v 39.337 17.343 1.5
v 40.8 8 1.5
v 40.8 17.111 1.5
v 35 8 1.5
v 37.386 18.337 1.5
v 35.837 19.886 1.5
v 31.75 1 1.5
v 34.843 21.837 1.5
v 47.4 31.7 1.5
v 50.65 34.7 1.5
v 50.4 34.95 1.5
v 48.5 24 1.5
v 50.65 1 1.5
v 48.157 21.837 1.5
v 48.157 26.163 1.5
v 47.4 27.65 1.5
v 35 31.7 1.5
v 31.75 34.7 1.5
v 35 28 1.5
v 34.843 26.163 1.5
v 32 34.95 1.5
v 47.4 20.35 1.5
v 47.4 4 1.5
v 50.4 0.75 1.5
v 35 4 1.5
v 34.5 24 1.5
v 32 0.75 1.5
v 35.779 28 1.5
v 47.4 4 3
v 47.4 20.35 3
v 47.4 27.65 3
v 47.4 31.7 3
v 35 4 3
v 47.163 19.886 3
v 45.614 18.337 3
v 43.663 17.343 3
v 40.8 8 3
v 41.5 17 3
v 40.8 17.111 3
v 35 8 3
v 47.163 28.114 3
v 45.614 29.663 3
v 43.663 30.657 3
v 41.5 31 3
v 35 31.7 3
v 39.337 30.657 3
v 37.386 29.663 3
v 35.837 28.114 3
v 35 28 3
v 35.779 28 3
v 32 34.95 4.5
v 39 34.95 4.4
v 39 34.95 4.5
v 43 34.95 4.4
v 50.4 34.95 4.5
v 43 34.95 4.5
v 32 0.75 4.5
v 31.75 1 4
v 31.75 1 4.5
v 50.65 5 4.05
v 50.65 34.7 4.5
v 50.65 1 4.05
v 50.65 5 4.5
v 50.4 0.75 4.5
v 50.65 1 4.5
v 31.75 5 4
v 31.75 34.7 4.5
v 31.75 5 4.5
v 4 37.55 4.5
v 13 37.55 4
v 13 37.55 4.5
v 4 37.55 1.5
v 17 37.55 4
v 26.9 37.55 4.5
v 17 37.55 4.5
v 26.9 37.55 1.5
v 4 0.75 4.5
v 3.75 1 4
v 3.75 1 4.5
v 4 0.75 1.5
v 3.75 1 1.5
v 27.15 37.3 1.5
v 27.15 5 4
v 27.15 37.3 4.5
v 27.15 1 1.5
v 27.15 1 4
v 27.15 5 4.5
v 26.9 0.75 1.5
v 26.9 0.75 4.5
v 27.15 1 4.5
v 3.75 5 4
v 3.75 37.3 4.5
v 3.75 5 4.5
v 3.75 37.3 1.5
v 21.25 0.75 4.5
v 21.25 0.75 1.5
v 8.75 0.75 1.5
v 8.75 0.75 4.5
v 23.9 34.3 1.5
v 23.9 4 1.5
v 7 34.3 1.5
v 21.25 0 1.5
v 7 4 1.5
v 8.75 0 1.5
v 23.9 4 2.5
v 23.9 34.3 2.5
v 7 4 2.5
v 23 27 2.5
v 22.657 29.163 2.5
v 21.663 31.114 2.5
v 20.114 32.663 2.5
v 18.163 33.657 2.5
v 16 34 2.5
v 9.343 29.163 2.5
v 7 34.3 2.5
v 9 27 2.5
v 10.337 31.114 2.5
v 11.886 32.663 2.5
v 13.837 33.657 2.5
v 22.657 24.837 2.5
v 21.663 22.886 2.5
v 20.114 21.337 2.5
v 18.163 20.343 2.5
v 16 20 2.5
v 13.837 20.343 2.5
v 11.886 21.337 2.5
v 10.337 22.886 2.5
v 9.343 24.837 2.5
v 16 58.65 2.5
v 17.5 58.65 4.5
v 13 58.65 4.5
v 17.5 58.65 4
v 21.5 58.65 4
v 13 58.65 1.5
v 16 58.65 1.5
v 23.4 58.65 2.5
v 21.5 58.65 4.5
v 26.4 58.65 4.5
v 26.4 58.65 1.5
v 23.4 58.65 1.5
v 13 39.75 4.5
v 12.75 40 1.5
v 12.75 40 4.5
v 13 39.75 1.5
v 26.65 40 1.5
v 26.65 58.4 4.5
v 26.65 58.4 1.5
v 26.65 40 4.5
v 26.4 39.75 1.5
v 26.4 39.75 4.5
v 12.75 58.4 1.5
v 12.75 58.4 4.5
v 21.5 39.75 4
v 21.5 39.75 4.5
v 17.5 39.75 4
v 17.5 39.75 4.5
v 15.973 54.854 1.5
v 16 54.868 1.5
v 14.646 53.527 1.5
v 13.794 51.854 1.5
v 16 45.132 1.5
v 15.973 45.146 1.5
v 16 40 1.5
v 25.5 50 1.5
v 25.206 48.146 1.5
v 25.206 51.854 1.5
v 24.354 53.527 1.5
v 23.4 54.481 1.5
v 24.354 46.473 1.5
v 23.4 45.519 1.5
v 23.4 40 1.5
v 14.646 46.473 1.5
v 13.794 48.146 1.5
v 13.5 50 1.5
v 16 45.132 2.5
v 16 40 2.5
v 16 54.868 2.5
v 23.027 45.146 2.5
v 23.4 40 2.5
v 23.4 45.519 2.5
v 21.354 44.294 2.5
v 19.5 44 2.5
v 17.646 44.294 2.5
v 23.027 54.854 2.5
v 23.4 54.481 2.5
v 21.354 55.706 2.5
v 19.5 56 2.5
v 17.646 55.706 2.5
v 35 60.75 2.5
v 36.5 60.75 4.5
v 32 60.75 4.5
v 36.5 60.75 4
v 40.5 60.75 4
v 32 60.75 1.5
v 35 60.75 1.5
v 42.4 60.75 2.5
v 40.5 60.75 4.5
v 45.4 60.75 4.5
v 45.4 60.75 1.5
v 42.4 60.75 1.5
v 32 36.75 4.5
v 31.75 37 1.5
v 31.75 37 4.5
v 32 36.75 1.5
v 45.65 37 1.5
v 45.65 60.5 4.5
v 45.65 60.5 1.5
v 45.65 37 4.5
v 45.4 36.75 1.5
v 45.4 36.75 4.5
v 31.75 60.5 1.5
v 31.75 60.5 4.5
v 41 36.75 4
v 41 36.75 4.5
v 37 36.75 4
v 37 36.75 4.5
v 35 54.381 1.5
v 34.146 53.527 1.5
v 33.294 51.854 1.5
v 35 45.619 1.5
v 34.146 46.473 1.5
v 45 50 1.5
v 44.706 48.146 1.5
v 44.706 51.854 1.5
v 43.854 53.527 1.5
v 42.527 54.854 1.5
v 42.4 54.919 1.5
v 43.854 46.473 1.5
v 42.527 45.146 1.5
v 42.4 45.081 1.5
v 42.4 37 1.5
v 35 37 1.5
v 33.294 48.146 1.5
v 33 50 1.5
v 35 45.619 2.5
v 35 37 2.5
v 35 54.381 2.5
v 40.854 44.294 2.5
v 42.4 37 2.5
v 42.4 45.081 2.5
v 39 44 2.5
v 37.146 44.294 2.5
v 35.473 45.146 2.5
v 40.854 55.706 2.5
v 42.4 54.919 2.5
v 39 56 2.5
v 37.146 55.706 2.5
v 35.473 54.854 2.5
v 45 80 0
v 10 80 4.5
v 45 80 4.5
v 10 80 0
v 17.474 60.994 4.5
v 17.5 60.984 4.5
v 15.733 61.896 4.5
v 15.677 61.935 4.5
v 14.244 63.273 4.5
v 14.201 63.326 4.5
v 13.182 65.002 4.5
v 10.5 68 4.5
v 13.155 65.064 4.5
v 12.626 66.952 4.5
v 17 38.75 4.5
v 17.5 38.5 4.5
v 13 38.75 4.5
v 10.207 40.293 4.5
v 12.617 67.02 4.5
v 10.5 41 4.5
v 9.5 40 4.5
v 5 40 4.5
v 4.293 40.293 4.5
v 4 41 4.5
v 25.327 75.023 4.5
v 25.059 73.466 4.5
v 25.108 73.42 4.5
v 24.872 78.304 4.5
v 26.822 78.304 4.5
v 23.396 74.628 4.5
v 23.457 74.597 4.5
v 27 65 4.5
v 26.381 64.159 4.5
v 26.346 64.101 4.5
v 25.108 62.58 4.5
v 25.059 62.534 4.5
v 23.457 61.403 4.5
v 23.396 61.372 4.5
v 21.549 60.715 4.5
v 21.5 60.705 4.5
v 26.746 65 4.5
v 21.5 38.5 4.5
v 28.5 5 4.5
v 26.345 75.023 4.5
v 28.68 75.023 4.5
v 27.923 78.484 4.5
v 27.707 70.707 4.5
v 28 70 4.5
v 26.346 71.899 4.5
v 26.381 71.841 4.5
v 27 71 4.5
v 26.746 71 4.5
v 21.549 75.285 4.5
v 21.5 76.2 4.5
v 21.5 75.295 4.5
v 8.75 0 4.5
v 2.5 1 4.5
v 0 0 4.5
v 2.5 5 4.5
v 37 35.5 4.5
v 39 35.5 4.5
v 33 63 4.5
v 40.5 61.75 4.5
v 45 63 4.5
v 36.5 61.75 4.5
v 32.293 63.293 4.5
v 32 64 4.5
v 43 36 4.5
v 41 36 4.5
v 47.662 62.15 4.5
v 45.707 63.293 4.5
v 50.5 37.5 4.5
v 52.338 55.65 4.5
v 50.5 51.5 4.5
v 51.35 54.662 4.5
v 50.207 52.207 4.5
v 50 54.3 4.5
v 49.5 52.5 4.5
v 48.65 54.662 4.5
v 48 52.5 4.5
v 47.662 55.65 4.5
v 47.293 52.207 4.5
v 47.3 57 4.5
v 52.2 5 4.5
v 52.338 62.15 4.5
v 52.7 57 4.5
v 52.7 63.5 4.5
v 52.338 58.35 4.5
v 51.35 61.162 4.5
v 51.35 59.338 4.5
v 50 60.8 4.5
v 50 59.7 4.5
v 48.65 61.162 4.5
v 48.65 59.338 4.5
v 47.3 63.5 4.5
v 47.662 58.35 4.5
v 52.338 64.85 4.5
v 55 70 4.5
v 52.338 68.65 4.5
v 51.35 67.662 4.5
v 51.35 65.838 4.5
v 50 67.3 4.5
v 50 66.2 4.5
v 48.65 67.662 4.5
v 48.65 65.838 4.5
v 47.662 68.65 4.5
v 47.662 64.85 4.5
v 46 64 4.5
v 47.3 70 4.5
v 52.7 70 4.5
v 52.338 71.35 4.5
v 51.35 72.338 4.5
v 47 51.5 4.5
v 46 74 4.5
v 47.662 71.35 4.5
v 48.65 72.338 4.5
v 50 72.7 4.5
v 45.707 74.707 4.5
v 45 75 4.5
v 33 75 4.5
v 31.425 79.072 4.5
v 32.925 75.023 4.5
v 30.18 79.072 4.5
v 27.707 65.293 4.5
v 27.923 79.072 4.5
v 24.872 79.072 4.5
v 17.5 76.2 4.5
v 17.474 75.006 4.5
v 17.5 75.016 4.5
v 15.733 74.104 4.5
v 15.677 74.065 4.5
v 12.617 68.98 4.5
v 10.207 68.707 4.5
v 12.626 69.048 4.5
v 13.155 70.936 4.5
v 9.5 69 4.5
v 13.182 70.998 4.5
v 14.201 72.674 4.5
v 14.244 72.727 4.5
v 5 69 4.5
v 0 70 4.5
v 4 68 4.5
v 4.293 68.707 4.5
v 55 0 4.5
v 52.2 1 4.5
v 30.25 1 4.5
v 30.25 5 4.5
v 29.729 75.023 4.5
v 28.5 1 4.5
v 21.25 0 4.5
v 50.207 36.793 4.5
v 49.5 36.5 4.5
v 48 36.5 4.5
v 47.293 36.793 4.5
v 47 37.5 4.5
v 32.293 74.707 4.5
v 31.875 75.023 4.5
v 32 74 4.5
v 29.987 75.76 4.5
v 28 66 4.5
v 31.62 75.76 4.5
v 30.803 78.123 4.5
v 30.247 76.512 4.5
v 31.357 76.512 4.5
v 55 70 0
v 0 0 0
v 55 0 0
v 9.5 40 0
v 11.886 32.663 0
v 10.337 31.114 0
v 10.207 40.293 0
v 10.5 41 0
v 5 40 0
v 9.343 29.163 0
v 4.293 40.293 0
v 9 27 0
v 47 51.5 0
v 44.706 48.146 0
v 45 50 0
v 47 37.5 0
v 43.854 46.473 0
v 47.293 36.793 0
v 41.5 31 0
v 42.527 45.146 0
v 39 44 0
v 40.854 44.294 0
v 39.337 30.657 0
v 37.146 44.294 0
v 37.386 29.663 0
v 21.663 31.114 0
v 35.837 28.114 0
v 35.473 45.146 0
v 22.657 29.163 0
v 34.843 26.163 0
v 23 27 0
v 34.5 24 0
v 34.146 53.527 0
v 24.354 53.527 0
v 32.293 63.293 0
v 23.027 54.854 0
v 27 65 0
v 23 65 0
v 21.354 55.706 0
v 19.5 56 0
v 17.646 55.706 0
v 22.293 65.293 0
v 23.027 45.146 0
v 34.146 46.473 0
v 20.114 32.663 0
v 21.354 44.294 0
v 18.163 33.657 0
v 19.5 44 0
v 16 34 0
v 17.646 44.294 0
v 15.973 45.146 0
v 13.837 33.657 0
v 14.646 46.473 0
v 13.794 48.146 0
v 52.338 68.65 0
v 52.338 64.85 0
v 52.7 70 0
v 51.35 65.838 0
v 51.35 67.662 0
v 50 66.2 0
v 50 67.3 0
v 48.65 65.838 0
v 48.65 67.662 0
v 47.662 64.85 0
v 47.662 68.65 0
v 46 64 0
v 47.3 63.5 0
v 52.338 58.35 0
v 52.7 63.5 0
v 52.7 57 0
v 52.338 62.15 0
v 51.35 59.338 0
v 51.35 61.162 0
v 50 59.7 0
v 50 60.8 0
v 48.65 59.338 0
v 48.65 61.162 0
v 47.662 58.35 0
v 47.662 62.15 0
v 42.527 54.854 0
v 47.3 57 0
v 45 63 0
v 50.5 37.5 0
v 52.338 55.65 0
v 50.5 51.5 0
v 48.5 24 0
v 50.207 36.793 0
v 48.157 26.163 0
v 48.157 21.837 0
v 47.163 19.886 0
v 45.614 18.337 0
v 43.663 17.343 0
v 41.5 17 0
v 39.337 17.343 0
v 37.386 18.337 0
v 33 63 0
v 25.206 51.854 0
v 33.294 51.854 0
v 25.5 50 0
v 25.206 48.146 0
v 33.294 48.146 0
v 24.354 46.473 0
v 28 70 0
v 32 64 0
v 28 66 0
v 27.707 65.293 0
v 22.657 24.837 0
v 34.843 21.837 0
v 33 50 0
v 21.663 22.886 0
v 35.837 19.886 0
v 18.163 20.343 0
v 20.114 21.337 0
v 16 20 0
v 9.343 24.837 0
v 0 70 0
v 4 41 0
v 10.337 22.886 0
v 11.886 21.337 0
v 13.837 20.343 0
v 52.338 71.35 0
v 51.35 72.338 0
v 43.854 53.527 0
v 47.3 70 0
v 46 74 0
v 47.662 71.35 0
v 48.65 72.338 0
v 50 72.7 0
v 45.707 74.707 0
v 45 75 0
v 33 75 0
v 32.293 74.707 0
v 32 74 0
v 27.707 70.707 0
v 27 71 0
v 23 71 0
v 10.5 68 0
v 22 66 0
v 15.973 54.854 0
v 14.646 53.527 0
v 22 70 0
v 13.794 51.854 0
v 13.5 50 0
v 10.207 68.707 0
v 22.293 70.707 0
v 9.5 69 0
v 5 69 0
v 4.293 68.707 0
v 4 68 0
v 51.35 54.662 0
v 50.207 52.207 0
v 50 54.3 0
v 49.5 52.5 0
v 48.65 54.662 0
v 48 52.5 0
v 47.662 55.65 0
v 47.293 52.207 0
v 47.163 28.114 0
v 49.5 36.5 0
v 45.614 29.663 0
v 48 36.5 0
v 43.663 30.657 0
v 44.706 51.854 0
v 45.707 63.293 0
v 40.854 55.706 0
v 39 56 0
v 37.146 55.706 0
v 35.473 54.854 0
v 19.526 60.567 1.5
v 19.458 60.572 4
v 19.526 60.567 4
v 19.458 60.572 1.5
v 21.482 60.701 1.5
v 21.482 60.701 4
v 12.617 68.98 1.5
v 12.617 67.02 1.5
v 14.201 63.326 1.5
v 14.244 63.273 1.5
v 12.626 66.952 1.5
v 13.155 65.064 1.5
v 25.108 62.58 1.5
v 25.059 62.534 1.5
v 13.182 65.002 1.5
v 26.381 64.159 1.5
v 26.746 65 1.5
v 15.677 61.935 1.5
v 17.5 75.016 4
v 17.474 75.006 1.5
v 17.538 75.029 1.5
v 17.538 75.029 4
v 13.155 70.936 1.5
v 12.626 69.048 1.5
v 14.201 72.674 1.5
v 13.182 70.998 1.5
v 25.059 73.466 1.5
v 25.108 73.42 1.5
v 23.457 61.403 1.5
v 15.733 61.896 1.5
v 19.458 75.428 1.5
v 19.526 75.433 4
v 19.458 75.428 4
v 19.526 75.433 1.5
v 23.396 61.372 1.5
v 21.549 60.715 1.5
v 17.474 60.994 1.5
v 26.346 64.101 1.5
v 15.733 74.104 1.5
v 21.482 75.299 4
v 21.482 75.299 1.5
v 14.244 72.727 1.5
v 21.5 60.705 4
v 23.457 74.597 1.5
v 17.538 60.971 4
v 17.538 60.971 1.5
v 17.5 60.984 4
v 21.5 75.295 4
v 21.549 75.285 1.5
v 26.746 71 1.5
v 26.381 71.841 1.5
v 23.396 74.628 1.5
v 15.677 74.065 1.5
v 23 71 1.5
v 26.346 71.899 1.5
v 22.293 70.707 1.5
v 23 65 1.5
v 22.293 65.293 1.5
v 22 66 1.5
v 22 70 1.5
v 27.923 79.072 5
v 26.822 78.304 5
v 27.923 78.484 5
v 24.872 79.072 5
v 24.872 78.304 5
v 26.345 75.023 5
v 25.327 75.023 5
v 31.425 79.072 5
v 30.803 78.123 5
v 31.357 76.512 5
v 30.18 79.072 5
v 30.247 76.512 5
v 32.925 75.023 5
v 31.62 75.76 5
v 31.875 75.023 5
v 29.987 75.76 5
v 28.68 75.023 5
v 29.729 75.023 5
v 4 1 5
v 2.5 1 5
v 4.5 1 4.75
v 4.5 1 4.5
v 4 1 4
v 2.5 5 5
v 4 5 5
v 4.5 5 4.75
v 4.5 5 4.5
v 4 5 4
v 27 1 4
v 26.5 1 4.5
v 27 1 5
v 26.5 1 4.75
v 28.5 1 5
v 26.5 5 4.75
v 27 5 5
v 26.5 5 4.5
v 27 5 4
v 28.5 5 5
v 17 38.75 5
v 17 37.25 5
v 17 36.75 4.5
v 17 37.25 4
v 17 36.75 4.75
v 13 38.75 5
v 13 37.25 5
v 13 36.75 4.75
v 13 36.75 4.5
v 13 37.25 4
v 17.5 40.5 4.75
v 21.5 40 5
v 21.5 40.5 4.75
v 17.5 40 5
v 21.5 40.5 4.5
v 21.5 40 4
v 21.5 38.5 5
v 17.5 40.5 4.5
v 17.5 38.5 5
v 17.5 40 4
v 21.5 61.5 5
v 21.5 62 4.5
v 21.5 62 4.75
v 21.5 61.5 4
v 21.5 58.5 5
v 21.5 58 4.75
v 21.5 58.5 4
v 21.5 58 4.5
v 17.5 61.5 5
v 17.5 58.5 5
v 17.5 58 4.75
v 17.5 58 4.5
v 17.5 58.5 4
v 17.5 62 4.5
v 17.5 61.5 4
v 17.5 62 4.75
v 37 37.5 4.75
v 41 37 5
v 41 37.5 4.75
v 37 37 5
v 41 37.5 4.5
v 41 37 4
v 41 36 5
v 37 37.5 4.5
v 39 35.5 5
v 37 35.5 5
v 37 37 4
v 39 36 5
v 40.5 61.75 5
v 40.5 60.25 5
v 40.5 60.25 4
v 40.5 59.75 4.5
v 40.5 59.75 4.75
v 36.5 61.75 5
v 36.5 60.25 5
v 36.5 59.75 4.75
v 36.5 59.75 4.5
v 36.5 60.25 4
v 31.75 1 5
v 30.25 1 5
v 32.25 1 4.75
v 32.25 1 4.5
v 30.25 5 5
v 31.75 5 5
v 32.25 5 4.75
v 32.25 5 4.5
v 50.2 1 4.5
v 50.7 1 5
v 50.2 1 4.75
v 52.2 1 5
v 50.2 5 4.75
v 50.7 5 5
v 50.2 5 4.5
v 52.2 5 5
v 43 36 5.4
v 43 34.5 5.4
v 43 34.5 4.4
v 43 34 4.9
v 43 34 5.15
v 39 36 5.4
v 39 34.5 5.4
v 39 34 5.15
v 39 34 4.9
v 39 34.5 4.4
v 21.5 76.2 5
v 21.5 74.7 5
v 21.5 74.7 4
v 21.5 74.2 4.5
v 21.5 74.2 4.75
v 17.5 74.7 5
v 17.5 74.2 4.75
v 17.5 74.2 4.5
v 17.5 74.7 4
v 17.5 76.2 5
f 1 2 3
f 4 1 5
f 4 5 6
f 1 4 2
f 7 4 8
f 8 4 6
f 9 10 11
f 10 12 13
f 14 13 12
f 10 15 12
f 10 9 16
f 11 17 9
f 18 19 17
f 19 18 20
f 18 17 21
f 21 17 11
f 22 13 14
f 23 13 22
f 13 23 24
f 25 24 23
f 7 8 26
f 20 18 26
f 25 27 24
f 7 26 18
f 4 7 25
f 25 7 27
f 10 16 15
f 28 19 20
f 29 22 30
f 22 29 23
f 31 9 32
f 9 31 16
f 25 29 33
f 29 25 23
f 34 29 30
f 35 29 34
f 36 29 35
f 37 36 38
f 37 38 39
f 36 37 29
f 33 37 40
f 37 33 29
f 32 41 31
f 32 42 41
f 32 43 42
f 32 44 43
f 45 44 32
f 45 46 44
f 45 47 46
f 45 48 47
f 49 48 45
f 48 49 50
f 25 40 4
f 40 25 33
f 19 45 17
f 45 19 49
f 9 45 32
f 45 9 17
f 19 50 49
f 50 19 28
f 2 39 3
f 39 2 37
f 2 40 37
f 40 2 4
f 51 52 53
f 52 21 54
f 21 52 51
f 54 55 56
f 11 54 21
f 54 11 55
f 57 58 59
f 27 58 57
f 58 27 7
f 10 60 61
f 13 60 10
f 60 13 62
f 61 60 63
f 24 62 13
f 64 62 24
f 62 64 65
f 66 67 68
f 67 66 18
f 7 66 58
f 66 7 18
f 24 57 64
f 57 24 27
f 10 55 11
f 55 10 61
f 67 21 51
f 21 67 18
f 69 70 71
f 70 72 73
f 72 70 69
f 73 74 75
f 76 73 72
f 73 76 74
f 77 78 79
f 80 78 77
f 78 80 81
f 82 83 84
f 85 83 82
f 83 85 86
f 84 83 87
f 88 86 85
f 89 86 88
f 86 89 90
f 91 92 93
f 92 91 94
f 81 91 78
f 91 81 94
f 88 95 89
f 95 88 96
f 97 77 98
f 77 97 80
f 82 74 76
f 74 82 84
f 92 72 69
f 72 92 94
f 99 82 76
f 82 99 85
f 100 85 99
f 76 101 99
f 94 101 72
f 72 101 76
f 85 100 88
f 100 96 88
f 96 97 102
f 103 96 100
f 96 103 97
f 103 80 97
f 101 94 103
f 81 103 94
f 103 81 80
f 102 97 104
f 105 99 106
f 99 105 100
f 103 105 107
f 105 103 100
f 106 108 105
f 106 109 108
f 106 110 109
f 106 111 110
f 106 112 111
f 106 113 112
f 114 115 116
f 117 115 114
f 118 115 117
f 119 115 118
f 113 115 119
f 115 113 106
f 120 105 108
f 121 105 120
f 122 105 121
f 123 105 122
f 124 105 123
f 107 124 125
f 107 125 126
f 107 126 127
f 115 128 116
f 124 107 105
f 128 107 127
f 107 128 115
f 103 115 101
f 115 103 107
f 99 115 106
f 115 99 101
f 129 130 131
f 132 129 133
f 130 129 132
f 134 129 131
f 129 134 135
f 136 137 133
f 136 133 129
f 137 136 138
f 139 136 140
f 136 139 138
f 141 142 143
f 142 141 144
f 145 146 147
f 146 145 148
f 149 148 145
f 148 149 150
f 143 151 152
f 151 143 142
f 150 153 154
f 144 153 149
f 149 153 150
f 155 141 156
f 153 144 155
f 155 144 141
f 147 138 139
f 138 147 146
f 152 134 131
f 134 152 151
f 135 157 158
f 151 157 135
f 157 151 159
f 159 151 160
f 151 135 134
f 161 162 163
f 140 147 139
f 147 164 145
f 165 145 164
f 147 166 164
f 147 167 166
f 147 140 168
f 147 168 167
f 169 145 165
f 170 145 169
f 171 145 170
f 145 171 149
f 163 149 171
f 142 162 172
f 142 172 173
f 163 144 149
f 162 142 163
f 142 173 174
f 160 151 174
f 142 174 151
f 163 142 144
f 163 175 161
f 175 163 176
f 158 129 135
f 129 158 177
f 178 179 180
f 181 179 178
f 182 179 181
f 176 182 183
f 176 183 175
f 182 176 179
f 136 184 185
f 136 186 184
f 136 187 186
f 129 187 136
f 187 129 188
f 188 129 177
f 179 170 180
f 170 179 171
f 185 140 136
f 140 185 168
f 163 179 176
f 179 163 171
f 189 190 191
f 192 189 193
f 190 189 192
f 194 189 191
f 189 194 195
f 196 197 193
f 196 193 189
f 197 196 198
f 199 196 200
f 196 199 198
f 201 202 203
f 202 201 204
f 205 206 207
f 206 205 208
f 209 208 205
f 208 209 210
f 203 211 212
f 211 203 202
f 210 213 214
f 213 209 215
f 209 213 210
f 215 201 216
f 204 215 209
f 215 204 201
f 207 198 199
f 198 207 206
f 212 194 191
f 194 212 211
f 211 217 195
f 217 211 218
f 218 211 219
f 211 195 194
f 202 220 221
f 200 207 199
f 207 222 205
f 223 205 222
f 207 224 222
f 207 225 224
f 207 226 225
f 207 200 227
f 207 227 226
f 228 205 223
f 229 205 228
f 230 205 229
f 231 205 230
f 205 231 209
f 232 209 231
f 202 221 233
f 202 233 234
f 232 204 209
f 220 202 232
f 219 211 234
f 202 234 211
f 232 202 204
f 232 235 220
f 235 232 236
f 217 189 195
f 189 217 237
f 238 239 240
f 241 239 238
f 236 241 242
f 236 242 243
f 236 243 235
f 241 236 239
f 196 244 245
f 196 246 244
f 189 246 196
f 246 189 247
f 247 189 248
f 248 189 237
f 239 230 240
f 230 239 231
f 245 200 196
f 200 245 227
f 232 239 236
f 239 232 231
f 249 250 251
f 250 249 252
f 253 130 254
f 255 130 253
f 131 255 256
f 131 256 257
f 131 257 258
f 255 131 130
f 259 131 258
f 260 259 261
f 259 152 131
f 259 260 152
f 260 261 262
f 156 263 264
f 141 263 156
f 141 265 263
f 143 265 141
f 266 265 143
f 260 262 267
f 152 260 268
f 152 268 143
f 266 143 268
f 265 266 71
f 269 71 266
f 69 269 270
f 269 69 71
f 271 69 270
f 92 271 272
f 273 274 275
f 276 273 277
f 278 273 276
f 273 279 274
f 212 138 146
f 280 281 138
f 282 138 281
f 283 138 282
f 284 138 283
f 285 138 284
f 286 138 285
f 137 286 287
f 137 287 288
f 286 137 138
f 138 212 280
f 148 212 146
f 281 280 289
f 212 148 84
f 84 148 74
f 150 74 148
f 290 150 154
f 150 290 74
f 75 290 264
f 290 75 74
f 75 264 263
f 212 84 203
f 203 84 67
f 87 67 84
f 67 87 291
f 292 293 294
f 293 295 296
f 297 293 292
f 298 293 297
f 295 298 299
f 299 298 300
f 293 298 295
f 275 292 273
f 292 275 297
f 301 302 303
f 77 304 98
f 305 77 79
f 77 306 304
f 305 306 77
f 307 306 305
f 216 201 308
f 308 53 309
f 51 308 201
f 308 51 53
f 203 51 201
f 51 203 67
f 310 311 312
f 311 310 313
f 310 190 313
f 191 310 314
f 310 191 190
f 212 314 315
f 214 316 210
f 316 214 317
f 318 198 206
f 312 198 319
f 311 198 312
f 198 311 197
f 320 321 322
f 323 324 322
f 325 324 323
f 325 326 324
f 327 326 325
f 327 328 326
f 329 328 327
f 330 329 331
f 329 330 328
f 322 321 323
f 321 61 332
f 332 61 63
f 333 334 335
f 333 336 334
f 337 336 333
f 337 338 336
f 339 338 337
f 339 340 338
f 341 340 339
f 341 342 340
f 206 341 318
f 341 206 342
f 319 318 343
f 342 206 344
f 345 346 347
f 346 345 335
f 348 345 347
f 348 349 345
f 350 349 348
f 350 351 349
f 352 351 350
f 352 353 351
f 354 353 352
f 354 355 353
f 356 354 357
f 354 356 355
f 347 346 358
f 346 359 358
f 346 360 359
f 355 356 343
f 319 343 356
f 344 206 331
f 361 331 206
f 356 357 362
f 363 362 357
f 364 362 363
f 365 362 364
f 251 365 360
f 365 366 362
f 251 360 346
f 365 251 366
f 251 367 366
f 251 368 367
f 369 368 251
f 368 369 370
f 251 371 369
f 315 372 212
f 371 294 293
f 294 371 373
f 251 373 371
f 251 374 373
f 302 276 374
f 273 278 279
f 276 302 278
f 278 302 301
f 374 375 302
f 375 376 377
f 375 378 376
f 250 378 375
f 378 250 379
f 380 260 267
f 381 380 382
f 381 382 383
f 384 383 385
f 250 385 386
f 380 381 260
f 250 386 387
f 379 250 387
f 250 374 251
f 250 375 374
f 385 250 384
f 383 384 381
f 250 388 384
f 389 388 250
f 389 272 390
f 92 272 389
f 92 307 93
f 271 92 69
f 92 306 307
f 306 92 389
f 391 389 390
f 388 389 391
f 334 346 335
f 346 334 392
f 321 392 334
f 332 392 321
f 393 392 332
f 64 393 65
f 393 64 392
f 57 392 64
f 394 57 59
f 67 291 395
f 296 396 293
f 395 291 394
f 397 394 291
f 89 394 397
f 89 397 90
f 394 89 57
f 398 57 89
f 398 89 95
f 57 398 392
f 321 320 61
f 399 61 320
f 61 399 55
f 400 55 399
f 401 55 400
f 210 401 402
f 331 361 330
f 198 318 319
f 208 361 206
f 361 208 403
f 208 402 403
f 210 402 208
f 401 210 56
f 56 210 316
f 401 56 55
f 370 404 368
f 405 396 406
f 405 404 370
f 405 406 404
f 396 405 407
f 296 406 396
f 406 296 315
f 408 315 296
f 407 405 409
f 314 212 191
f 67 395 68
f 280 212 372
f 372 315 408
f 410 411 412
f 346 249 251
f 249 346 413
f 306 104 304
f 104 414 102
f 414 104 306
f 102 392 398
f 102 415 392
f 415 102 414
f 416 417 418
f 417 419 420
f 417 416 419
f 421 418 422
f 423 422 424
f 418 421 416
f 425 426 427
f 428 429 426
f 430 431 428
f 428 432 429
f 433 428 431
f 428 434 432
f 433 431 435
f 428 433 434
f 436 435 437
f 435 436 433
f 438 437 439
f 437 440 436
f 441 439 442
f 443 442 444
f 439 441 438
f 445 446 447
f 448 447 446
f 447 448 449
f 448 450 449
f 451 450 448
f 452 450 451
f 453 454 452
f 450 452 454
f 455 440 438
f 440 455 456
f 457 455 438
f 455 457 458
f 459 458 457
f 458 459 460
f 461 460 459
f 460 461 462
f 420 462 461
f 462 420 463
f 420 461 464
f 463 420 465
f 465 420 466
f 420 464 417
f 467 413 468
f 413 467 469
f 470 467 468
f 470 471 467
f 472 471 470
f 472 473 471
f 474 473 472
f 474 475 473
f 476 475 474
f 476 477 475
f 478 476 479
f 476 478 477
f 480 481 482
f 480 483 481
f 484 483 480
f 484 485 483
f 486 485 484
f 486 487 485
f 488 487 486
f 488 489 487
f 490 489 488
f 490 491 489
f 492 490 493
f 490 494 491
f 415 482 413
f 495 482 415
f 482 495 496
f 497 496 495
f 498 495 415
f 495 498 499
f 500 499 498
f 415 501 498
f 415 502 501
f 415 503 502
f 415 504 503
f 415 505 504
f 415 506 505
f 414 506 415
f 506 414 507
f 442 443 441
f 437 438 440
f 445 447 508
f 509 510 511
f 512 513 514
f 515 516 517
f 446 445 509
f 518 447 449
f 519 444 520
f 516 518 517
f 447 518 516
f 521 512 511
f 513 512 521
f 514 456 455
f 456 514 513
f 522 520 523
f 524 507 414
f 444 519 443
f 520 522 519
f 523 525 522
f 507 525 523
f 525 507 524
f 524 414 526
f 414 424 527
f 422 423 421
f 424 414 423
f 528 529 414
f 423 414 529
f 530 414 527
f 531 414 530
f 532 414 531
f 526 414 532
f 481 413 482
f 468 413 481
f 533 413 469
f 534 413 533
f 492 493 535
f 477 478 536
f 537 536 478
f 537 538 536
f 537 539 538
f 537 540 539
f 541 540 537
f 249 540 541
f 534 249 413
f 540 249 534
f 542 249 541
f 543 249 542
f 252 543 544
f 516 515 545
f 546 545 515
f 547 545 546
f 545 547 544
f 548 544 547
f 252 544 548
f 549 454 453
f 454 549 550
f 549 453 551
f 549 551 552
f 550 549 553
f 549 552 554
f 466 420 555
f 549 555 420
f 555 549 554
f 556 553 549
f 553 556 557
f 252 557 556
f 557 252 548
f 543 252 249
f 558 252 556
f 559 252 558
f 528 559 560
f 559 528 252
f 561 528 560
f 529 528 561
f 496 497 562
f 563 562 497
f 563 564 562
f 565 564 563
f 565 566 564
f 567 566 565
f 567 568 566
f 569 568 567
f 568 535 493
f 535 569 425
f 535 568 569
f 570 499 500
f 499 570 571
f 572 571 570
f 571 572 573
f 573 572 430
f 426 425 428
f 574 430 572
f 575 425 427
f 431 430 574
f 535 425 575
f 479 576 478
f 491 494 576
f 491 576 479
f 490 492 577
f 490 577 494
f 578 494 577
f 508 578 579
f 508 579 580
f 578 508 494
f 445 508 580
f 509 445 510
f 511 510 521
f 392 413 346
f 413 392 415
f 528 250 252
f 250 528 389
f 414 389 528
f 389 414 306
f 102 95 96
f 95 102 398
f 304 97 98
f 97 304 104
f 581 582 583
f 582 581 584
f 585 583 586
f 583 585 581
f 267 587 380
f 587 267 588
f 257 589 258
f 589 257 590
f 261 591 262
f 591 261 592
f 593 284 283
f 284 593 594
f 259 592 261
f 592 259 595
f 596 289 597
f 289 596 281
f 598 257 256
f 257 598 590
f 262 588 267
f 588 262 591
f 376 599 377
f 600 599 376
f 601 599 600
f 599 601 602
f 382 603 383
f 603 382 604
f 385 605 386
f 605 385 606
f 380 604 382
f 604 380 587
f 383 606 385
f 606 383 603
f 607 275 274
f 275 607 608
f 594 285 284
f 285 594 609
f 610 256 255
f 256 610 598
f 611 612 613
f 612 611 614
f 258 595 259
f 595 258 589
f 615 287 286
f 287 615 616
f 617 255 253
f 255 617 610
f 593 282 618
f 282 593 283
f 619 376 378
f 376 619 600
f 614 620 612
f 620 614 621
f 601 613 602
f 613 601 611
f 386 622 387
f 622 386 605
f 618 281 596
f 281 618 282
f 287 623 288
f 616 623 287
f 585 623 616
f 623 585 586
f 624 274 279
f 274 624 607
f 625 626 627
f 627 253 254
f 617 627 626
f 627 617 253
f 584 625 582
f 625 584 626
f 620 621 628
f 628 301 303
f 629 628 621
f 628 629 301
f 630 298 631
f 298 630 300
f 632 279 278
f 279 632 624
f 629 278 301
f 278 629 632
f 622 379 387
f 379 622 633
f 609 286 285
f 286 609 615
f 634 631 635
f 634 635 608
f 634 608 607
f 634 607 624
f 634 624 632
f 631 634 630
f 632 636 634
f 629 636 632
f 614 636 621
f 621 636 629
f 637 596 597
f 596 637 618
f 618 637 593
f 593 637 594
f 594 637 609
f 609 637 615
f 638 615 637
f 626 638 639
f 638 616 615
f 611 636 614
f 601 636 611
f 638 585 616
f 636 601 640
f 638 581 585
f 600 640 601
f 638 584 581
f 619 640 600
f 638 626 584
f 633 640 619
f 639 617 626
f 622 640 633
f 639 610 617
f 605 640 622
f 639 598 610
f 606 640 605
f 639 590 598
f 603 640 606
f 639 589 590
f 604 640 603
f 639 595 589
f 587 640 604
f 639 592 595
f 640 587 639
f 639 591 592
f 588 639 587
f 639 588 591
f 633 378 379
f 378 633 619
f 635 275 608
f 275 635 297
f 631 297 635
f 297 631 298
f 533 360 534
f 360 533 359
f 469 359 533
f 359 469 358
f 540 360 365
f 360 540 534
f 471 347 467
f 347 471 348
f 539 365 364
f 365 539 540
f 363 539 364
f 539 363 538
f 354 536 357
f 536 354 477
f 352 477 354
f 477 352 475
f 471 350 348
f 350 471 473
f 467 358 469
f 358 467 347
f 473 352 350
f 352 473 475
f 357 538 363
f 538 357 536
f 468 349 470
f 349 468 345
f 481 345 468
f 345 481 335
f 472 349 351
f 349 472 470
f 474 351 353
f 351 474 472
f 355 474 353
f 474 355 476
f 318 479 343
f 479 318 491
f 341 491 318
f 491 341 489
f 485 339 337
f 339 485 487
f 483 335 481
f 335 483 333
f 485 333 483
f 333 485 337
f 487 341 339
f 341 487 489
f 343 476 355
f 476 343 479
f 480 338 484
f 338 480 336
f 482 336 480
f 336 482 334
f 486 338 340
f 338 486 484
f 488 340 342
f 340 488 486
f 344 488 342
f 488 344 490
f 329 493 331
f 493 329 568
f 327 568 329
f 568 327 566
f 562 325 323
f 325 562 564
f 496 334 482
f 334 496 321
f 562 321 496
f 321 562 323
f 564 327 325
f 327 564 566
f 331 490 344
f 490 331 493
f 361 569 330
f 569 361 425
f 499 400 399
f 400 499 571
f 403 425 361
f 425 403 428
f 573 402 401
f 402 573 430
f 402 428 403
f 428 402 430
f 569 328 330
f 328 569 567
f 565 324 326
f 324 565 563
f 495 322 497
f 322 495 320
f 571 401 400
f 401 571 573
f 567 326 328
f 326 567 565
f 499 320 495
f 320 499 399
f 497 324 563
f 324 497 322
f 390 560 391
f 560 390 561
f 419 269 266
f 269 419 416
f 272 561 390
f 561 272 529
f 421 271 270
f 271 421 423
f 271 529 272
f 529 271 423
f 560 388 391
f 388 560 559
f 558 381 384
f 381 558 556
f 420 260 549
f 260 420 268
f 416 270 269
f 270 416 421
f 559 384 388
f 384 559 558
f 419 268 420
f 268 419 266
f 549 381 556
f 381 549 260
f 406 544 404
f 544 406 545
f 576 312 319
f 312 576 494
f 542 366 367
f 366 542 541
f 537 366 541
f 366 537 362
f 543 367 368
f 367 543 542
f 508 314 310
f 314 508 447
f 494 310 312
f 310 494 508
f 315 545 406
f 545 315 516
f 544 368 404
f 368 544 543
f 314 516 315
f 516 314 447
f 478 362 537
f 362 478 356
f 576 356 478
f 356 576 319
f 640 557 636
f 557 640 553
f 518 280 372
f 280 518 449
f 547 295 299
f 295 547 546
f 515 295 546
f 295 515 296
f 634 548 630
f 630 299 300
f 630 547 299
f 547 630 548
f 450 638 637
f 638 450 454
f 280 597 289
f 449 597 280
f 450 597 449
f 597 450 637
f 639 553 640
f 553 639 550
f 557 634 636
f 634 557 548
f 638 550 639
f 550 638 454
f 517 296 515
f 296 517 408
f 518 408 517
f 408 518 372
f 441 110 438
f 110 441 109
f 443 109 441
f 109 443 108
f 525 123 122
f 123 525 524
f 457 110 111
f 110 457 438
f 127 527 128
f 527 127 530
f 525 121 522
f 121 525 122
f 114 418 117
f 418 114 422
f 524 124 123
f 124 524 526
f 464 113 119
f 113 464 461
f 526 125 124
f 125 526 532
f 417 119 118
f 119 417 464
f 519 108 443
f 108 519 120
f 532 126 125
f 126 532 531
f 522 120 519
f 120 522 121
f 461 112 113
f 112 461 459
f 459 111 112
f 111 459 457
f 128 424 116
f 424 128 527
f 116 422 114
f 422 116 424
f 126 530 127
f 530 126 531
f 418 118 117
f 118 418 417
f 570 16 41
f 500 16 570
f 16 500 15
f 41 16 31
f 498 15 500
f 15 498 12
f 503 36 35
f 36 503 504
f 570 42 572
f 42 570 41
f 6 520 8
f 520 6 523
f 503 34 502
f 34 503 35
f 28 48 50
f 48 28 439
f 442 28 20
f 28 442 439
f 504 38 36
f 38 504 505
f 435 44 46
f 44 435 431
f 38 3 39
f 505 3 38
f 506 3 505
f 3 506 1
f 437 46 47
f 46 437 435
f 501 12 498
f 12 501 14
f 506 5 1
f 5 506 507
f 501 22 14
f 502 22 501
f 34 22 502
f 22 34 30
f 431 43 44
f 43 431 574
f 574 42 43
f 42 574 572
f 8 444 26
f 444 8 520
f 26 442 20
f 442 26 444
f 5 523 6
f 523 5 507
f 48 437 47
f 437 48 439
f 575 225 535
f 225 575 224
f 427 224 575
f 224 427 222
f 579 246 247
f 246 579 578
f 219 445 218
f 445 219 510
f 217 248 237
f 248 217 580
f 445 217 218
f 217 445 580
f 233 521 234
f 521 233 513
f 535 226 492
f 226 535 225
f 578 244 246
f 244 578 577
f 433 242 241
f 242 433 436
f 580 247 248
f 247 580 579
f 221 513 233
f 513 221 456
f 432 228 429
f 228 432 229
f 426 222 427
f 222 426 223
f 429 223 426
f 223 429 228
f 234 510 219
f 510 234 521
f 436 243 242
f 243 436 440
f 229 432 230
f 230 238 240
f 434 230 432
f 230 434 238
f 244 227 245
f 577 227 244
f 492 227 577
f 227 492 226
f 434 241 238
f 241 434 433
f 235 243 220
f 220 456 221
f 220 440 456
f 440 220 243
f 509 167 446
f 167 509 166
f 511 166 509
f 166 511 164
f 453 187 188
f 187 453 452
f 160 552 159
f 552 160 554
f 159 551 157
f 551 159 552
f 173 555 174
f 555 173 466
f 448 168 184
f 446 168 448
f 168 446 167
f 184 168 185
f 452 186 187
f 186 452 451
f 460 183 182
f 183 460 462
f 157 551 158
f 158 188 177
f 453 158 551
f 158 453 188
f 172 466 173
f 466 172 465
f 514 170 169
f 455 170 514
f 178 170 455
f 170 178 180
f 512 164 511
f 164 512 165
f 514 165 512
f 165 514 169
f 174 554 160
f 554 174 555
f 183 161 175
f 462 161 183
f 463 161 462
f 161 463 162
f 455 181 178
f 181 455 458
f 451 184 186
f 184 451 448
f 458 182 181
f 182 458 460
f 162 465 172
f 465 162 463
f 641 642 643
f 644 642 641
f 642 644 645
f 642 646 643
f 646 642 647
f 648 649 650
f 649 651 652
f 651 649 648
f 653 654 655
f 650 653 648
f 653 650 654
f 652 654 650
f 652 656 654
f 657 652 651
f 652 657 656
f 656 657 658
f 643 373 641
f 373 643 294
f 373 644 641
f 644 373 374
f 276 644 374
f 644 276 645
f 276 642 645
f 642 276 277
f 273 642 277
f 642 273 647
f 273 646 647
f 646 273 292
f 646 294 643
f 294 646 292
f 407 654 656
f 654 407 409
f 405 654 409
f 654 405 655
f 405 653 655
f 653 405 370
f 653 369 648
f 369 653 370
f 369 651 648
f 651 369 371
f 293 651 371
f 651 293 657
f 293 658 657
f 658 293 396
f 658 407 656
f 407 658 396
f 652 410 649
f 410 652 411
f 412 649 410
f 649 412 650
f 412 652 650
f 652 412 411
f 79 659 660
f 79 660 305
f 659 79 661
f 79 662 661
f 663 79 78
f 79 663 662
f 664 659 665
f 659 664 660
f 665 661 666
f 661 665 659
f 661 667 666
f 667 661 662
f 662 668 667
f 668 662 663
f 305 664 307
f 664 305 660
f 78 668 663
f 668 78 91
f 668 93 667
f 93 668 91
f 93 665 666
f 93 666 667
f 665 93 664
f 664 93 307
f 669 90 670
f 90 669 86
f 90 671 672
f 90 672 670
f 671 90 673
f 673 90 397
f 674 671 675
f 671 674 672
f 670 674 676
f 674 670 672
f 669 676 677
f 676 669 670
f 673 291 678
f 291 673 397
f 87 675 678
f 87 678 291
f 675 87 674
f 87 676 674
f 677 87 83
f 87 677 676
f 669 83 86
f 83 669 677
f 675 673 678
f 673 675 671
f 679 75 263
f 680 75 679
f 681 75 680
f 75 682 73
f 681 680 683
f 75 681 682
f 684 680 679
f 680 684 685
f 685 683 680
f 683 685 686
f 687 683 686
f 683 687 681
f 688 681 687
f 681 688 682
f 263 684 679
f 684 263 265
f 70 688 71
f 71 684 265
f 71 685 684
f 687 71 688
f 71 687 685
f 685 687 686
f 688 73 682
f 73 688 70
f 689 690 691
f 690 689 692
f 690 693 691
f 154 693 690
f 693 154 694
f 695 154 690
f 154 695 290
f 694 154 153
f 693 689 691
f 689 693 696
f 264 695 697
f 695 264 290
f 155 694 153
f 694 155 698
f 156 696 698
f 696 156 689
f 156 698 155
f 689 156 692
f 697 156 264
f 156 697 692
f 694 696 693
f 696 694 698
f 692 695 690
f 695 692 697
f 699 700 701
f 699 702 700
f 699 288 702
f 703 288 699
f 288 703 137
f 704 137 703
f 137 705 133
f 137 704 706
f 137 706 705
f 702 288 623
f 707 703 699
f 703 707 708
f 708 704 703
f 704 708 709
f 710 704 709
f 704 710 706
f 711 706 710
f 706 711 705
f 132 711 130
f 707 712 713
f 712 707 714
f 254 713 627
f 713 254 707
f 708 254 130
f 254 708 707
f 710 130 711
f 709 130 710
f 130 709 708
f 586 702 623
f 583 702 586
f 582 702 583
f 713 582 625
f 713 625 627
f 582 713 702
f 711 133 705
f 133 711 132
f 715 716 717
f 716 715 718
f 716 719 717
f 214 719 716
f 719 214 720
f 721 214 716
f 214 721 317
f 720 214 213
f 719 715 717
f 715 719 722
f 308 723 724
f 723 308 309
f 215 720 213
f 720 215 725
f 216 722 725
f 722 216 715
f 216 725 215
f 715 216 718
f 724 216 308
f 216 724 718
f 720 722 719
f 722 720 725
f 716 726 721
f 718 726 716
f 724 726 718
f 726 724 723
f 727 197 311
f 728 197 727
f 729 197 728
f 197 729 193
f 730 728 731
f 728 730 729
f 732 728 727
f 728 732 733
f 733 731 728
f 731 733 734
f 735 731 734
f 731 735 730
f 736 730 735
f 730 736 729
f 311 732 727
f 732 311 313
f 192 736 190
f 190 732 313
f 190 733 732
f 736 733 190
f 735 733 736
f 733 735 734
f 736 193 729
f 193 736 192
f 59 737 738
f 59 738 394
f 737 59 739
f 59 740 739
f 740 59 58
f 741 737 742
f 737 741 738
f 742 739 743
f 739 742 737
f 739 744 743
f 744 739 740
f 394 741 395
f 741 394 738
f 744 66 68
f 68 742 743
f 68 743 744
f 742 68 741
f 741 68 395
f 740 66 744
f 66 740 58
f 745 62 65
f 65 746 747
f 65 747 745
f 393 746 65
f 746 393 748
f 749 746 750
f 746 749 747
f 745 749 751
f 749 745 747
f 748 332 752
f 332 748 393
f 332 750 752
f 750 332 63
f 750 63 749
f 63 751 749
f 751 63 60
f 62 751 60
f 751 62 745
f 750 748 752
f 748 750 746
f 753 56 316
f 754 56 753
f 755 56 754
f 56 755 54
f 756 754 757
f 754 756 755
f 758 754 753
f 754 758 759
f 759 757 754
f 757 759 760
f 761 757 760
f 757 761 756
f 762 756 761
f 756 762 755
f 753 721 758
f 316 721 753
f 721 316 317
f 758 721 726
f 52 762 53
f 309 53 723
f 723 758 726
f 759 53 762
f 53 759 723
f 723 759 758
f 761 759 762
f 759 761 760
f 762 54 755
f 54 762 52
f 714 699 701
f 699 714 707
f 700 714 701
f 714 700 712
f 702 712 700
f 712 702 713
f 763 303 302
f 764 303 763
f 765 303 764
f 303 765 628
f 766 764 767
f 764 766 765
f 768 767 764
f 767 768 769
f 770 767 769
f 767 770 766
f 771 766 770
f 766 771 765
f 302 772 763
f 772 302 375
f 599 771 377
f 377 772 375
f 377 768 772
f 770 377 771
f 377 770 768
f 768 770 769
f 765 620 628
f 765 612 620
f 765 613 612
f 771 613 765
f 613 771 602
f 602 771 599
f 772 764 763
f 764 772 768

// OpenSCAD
tol=0.25;
extra=4;


difference(){   // cut the board and components out of 
    // the base plate #1
    
// Base 1 plate
B1p=[ [0,0], [55,0], [55,70], [45,80],
[10,80], [0,70] ];
translate([0,0,0]) color("gray")
linear_extrude(height=4.5)
polygon(points=B1p);

//union(){
// Pro Mini
translate([32,1,1.5]) color("red"){
    difference(){
        linear_extrude(height=0.86+extra) 
        offset(r=tol) square(size=[18.4, 33.7]);

        difference(){
        linear_extrude(height=1.5) 
        offset(r=-3) square(size=[18.4, 33.7]);

        linear_extrude(height=1.5) 
        translate([2.8,7,0]) square(size=[6,20]);
        }

    }
}

// Adafruit PowerBoost 1000c
translate([4,1,1.5]) color("blue"){
    difference(){
        linear_extrude(height=1.7+extra) 
        offset(r=tol) square(size=[22.9, 36.3]);

        linear_extrude(height=1) 
        offset(r=-3) square(size=[22.9, 36.3]);
    }
}
// notch for the USB charger cable
translate([9,0,1.5]) color("pink"){
    linear_extrude(height=1.7+extra) 
        offset(r=tol) square(size=[12, 2]);
}

// TXB0104 Level Shifter
translate([13,40,1.5]) color("green") {
    difference(){
        linear_extrude(height=1.7+extra) 
        offset(r=tol) square(size=[13.4, 18.4]);
            
        linear_extrude(height=1) 
        translate([3,0,0]) square(size=[7.4, 22]);
    }
}

// LIS3DH
translate([32,37,1.5]) color("yellow") {
    difference(){
        linear_extrude(height=1.7+extra) 
        offset(r=tol) square(size=[13.4, 23.5]);
            
        linear_extrude(height=1) 
        translate([3,0,0]) square(size=[7.4, 26]);
    } 
}

// Piezo
translate([20,68,1.5]) color("orange") {
    linear_extrude(height=1.4+extra) 
    offset(r=tol)
     circle(r=7.2);
}

// Led holes
translate([50,70,-2]) color("red") {
cylinder(h=8,r=2.7,$fn=12);
}
translate([50,63.5,-2]) color("yellow") {
cylinder(h=8,r=2.7,$fn=12);
}
translate([50,57,-2]) color("green") {
cylinder(h=8,r=2.7,$fn=12);
}

// Wire Pass-thru also lightweighting
translate([48,37.5,-2]) color("black") {
    linear_extrude(height=12) 
    offset(r=1,$fn=8) square(size=[1.5,14]);
}
translate([5,41,-2]) color("black") {
    linear_extrude(height=12) 
    offset(r=1, $fn=8) square(size=[4.5,27]);
}
translate([33,64,-2]) color("black") {
    linear_extrude(height=12) 
    offset(r=1,$fn=8) square(size=[12,10]);
}
translate([23,66,-2]) color("black") {
    linear_extrude(height=12) 
    offset(r=1,$fn=8) square(size=[4,4]);
}

// Popouts for the boards
translate([16,27,-2]) color("cyan") {
cylinder(h=12,r=7,$fn=20);
}
translate([41.5,24,-2]) color("cyan") {
cylinder(h=12,r=7,$fn=20);
}
translate([39,50,-2]) color("cyan") {
cylinder(h=12,r=6,$fn=20);
}
translate([19.5,50,-2]) color("cyan") {
cylinder(h=12,r=6,$fn=20);
}

} // end of diffence

// add text
translate ([24.5,77,3.5]) color("red") 
    linear_extrude(height=1.5){
    text("7A", font = "Open Sans:style=Bold", size=4,halign="left",valign="center",spacing=1.1);
    }



pt1=[ [0,0], [0.5,0.5], [0.5,0.75], [0,1], [-1.5,1], [-1.5,0] ];
// retainer tabs blue
translate([4,5,4]) color("orange") {
    rotate([90,0,0]) linear_extrude(height=4) polygon(points=pt1);
}
translate([27,1,4]) color("orange") {
    rotate([90,0,180]) linear_extrude(height=4) polygon(points=pt1);
}
translate([17,37.25,4]) color("orange") {
    rotate([90,0,-90]) linear_extrude(height=4) polygon(points=pt1);
}
    
// retainer tabs green
translate([17.5,40,4]) color("orange") {
    rotate([90,0,90]) linear_extrude(height=4) polygon(points=pt1);
}
translate([21.5,58.5,4]) color("orange") {
    rotate([90,0,-90]) linear_extrude(height=4) polygon(points=pt1);
}

// retainer tabs yellow
translate([37,37,4]) color("orange") {
    rotate([90,0,90]) linear_extrude(height=4) polygon(points=pt1);
}
translate([40.5,60.25,4]) color("orange") {
    rotate([90,0,-90]) linear_extrude(height=4) polygon(points=pt1);
}

// retainer tabs red
translate([31.75,5,4]) color("orange") {
    rotate([90,0,0]) linear_extrude(height=4) polygon(points=pt1);
}
translate([50.7,1,4]) color("orange") {
    rotate([90,0,180]) linear_extrude(height=4) polygon(points=pt1);
}
translate([43,34.5,4.4]) color("orange") {
    rotate([90,0,-90]) linear_extrude(height=4) polygon(points=pt1);
}
    

// retainer tabs piezo
translate([17.5,61.5,4]) color("orange") {
    rotate([90,0,90]) linear_extrude(height=4) polygon(points=pt1);
}
translate([21.5,74.7,4]) color("orange") {
    rotate([90,0,-90]) linear_extrude(height=4) polygon(points=pt1);
}
